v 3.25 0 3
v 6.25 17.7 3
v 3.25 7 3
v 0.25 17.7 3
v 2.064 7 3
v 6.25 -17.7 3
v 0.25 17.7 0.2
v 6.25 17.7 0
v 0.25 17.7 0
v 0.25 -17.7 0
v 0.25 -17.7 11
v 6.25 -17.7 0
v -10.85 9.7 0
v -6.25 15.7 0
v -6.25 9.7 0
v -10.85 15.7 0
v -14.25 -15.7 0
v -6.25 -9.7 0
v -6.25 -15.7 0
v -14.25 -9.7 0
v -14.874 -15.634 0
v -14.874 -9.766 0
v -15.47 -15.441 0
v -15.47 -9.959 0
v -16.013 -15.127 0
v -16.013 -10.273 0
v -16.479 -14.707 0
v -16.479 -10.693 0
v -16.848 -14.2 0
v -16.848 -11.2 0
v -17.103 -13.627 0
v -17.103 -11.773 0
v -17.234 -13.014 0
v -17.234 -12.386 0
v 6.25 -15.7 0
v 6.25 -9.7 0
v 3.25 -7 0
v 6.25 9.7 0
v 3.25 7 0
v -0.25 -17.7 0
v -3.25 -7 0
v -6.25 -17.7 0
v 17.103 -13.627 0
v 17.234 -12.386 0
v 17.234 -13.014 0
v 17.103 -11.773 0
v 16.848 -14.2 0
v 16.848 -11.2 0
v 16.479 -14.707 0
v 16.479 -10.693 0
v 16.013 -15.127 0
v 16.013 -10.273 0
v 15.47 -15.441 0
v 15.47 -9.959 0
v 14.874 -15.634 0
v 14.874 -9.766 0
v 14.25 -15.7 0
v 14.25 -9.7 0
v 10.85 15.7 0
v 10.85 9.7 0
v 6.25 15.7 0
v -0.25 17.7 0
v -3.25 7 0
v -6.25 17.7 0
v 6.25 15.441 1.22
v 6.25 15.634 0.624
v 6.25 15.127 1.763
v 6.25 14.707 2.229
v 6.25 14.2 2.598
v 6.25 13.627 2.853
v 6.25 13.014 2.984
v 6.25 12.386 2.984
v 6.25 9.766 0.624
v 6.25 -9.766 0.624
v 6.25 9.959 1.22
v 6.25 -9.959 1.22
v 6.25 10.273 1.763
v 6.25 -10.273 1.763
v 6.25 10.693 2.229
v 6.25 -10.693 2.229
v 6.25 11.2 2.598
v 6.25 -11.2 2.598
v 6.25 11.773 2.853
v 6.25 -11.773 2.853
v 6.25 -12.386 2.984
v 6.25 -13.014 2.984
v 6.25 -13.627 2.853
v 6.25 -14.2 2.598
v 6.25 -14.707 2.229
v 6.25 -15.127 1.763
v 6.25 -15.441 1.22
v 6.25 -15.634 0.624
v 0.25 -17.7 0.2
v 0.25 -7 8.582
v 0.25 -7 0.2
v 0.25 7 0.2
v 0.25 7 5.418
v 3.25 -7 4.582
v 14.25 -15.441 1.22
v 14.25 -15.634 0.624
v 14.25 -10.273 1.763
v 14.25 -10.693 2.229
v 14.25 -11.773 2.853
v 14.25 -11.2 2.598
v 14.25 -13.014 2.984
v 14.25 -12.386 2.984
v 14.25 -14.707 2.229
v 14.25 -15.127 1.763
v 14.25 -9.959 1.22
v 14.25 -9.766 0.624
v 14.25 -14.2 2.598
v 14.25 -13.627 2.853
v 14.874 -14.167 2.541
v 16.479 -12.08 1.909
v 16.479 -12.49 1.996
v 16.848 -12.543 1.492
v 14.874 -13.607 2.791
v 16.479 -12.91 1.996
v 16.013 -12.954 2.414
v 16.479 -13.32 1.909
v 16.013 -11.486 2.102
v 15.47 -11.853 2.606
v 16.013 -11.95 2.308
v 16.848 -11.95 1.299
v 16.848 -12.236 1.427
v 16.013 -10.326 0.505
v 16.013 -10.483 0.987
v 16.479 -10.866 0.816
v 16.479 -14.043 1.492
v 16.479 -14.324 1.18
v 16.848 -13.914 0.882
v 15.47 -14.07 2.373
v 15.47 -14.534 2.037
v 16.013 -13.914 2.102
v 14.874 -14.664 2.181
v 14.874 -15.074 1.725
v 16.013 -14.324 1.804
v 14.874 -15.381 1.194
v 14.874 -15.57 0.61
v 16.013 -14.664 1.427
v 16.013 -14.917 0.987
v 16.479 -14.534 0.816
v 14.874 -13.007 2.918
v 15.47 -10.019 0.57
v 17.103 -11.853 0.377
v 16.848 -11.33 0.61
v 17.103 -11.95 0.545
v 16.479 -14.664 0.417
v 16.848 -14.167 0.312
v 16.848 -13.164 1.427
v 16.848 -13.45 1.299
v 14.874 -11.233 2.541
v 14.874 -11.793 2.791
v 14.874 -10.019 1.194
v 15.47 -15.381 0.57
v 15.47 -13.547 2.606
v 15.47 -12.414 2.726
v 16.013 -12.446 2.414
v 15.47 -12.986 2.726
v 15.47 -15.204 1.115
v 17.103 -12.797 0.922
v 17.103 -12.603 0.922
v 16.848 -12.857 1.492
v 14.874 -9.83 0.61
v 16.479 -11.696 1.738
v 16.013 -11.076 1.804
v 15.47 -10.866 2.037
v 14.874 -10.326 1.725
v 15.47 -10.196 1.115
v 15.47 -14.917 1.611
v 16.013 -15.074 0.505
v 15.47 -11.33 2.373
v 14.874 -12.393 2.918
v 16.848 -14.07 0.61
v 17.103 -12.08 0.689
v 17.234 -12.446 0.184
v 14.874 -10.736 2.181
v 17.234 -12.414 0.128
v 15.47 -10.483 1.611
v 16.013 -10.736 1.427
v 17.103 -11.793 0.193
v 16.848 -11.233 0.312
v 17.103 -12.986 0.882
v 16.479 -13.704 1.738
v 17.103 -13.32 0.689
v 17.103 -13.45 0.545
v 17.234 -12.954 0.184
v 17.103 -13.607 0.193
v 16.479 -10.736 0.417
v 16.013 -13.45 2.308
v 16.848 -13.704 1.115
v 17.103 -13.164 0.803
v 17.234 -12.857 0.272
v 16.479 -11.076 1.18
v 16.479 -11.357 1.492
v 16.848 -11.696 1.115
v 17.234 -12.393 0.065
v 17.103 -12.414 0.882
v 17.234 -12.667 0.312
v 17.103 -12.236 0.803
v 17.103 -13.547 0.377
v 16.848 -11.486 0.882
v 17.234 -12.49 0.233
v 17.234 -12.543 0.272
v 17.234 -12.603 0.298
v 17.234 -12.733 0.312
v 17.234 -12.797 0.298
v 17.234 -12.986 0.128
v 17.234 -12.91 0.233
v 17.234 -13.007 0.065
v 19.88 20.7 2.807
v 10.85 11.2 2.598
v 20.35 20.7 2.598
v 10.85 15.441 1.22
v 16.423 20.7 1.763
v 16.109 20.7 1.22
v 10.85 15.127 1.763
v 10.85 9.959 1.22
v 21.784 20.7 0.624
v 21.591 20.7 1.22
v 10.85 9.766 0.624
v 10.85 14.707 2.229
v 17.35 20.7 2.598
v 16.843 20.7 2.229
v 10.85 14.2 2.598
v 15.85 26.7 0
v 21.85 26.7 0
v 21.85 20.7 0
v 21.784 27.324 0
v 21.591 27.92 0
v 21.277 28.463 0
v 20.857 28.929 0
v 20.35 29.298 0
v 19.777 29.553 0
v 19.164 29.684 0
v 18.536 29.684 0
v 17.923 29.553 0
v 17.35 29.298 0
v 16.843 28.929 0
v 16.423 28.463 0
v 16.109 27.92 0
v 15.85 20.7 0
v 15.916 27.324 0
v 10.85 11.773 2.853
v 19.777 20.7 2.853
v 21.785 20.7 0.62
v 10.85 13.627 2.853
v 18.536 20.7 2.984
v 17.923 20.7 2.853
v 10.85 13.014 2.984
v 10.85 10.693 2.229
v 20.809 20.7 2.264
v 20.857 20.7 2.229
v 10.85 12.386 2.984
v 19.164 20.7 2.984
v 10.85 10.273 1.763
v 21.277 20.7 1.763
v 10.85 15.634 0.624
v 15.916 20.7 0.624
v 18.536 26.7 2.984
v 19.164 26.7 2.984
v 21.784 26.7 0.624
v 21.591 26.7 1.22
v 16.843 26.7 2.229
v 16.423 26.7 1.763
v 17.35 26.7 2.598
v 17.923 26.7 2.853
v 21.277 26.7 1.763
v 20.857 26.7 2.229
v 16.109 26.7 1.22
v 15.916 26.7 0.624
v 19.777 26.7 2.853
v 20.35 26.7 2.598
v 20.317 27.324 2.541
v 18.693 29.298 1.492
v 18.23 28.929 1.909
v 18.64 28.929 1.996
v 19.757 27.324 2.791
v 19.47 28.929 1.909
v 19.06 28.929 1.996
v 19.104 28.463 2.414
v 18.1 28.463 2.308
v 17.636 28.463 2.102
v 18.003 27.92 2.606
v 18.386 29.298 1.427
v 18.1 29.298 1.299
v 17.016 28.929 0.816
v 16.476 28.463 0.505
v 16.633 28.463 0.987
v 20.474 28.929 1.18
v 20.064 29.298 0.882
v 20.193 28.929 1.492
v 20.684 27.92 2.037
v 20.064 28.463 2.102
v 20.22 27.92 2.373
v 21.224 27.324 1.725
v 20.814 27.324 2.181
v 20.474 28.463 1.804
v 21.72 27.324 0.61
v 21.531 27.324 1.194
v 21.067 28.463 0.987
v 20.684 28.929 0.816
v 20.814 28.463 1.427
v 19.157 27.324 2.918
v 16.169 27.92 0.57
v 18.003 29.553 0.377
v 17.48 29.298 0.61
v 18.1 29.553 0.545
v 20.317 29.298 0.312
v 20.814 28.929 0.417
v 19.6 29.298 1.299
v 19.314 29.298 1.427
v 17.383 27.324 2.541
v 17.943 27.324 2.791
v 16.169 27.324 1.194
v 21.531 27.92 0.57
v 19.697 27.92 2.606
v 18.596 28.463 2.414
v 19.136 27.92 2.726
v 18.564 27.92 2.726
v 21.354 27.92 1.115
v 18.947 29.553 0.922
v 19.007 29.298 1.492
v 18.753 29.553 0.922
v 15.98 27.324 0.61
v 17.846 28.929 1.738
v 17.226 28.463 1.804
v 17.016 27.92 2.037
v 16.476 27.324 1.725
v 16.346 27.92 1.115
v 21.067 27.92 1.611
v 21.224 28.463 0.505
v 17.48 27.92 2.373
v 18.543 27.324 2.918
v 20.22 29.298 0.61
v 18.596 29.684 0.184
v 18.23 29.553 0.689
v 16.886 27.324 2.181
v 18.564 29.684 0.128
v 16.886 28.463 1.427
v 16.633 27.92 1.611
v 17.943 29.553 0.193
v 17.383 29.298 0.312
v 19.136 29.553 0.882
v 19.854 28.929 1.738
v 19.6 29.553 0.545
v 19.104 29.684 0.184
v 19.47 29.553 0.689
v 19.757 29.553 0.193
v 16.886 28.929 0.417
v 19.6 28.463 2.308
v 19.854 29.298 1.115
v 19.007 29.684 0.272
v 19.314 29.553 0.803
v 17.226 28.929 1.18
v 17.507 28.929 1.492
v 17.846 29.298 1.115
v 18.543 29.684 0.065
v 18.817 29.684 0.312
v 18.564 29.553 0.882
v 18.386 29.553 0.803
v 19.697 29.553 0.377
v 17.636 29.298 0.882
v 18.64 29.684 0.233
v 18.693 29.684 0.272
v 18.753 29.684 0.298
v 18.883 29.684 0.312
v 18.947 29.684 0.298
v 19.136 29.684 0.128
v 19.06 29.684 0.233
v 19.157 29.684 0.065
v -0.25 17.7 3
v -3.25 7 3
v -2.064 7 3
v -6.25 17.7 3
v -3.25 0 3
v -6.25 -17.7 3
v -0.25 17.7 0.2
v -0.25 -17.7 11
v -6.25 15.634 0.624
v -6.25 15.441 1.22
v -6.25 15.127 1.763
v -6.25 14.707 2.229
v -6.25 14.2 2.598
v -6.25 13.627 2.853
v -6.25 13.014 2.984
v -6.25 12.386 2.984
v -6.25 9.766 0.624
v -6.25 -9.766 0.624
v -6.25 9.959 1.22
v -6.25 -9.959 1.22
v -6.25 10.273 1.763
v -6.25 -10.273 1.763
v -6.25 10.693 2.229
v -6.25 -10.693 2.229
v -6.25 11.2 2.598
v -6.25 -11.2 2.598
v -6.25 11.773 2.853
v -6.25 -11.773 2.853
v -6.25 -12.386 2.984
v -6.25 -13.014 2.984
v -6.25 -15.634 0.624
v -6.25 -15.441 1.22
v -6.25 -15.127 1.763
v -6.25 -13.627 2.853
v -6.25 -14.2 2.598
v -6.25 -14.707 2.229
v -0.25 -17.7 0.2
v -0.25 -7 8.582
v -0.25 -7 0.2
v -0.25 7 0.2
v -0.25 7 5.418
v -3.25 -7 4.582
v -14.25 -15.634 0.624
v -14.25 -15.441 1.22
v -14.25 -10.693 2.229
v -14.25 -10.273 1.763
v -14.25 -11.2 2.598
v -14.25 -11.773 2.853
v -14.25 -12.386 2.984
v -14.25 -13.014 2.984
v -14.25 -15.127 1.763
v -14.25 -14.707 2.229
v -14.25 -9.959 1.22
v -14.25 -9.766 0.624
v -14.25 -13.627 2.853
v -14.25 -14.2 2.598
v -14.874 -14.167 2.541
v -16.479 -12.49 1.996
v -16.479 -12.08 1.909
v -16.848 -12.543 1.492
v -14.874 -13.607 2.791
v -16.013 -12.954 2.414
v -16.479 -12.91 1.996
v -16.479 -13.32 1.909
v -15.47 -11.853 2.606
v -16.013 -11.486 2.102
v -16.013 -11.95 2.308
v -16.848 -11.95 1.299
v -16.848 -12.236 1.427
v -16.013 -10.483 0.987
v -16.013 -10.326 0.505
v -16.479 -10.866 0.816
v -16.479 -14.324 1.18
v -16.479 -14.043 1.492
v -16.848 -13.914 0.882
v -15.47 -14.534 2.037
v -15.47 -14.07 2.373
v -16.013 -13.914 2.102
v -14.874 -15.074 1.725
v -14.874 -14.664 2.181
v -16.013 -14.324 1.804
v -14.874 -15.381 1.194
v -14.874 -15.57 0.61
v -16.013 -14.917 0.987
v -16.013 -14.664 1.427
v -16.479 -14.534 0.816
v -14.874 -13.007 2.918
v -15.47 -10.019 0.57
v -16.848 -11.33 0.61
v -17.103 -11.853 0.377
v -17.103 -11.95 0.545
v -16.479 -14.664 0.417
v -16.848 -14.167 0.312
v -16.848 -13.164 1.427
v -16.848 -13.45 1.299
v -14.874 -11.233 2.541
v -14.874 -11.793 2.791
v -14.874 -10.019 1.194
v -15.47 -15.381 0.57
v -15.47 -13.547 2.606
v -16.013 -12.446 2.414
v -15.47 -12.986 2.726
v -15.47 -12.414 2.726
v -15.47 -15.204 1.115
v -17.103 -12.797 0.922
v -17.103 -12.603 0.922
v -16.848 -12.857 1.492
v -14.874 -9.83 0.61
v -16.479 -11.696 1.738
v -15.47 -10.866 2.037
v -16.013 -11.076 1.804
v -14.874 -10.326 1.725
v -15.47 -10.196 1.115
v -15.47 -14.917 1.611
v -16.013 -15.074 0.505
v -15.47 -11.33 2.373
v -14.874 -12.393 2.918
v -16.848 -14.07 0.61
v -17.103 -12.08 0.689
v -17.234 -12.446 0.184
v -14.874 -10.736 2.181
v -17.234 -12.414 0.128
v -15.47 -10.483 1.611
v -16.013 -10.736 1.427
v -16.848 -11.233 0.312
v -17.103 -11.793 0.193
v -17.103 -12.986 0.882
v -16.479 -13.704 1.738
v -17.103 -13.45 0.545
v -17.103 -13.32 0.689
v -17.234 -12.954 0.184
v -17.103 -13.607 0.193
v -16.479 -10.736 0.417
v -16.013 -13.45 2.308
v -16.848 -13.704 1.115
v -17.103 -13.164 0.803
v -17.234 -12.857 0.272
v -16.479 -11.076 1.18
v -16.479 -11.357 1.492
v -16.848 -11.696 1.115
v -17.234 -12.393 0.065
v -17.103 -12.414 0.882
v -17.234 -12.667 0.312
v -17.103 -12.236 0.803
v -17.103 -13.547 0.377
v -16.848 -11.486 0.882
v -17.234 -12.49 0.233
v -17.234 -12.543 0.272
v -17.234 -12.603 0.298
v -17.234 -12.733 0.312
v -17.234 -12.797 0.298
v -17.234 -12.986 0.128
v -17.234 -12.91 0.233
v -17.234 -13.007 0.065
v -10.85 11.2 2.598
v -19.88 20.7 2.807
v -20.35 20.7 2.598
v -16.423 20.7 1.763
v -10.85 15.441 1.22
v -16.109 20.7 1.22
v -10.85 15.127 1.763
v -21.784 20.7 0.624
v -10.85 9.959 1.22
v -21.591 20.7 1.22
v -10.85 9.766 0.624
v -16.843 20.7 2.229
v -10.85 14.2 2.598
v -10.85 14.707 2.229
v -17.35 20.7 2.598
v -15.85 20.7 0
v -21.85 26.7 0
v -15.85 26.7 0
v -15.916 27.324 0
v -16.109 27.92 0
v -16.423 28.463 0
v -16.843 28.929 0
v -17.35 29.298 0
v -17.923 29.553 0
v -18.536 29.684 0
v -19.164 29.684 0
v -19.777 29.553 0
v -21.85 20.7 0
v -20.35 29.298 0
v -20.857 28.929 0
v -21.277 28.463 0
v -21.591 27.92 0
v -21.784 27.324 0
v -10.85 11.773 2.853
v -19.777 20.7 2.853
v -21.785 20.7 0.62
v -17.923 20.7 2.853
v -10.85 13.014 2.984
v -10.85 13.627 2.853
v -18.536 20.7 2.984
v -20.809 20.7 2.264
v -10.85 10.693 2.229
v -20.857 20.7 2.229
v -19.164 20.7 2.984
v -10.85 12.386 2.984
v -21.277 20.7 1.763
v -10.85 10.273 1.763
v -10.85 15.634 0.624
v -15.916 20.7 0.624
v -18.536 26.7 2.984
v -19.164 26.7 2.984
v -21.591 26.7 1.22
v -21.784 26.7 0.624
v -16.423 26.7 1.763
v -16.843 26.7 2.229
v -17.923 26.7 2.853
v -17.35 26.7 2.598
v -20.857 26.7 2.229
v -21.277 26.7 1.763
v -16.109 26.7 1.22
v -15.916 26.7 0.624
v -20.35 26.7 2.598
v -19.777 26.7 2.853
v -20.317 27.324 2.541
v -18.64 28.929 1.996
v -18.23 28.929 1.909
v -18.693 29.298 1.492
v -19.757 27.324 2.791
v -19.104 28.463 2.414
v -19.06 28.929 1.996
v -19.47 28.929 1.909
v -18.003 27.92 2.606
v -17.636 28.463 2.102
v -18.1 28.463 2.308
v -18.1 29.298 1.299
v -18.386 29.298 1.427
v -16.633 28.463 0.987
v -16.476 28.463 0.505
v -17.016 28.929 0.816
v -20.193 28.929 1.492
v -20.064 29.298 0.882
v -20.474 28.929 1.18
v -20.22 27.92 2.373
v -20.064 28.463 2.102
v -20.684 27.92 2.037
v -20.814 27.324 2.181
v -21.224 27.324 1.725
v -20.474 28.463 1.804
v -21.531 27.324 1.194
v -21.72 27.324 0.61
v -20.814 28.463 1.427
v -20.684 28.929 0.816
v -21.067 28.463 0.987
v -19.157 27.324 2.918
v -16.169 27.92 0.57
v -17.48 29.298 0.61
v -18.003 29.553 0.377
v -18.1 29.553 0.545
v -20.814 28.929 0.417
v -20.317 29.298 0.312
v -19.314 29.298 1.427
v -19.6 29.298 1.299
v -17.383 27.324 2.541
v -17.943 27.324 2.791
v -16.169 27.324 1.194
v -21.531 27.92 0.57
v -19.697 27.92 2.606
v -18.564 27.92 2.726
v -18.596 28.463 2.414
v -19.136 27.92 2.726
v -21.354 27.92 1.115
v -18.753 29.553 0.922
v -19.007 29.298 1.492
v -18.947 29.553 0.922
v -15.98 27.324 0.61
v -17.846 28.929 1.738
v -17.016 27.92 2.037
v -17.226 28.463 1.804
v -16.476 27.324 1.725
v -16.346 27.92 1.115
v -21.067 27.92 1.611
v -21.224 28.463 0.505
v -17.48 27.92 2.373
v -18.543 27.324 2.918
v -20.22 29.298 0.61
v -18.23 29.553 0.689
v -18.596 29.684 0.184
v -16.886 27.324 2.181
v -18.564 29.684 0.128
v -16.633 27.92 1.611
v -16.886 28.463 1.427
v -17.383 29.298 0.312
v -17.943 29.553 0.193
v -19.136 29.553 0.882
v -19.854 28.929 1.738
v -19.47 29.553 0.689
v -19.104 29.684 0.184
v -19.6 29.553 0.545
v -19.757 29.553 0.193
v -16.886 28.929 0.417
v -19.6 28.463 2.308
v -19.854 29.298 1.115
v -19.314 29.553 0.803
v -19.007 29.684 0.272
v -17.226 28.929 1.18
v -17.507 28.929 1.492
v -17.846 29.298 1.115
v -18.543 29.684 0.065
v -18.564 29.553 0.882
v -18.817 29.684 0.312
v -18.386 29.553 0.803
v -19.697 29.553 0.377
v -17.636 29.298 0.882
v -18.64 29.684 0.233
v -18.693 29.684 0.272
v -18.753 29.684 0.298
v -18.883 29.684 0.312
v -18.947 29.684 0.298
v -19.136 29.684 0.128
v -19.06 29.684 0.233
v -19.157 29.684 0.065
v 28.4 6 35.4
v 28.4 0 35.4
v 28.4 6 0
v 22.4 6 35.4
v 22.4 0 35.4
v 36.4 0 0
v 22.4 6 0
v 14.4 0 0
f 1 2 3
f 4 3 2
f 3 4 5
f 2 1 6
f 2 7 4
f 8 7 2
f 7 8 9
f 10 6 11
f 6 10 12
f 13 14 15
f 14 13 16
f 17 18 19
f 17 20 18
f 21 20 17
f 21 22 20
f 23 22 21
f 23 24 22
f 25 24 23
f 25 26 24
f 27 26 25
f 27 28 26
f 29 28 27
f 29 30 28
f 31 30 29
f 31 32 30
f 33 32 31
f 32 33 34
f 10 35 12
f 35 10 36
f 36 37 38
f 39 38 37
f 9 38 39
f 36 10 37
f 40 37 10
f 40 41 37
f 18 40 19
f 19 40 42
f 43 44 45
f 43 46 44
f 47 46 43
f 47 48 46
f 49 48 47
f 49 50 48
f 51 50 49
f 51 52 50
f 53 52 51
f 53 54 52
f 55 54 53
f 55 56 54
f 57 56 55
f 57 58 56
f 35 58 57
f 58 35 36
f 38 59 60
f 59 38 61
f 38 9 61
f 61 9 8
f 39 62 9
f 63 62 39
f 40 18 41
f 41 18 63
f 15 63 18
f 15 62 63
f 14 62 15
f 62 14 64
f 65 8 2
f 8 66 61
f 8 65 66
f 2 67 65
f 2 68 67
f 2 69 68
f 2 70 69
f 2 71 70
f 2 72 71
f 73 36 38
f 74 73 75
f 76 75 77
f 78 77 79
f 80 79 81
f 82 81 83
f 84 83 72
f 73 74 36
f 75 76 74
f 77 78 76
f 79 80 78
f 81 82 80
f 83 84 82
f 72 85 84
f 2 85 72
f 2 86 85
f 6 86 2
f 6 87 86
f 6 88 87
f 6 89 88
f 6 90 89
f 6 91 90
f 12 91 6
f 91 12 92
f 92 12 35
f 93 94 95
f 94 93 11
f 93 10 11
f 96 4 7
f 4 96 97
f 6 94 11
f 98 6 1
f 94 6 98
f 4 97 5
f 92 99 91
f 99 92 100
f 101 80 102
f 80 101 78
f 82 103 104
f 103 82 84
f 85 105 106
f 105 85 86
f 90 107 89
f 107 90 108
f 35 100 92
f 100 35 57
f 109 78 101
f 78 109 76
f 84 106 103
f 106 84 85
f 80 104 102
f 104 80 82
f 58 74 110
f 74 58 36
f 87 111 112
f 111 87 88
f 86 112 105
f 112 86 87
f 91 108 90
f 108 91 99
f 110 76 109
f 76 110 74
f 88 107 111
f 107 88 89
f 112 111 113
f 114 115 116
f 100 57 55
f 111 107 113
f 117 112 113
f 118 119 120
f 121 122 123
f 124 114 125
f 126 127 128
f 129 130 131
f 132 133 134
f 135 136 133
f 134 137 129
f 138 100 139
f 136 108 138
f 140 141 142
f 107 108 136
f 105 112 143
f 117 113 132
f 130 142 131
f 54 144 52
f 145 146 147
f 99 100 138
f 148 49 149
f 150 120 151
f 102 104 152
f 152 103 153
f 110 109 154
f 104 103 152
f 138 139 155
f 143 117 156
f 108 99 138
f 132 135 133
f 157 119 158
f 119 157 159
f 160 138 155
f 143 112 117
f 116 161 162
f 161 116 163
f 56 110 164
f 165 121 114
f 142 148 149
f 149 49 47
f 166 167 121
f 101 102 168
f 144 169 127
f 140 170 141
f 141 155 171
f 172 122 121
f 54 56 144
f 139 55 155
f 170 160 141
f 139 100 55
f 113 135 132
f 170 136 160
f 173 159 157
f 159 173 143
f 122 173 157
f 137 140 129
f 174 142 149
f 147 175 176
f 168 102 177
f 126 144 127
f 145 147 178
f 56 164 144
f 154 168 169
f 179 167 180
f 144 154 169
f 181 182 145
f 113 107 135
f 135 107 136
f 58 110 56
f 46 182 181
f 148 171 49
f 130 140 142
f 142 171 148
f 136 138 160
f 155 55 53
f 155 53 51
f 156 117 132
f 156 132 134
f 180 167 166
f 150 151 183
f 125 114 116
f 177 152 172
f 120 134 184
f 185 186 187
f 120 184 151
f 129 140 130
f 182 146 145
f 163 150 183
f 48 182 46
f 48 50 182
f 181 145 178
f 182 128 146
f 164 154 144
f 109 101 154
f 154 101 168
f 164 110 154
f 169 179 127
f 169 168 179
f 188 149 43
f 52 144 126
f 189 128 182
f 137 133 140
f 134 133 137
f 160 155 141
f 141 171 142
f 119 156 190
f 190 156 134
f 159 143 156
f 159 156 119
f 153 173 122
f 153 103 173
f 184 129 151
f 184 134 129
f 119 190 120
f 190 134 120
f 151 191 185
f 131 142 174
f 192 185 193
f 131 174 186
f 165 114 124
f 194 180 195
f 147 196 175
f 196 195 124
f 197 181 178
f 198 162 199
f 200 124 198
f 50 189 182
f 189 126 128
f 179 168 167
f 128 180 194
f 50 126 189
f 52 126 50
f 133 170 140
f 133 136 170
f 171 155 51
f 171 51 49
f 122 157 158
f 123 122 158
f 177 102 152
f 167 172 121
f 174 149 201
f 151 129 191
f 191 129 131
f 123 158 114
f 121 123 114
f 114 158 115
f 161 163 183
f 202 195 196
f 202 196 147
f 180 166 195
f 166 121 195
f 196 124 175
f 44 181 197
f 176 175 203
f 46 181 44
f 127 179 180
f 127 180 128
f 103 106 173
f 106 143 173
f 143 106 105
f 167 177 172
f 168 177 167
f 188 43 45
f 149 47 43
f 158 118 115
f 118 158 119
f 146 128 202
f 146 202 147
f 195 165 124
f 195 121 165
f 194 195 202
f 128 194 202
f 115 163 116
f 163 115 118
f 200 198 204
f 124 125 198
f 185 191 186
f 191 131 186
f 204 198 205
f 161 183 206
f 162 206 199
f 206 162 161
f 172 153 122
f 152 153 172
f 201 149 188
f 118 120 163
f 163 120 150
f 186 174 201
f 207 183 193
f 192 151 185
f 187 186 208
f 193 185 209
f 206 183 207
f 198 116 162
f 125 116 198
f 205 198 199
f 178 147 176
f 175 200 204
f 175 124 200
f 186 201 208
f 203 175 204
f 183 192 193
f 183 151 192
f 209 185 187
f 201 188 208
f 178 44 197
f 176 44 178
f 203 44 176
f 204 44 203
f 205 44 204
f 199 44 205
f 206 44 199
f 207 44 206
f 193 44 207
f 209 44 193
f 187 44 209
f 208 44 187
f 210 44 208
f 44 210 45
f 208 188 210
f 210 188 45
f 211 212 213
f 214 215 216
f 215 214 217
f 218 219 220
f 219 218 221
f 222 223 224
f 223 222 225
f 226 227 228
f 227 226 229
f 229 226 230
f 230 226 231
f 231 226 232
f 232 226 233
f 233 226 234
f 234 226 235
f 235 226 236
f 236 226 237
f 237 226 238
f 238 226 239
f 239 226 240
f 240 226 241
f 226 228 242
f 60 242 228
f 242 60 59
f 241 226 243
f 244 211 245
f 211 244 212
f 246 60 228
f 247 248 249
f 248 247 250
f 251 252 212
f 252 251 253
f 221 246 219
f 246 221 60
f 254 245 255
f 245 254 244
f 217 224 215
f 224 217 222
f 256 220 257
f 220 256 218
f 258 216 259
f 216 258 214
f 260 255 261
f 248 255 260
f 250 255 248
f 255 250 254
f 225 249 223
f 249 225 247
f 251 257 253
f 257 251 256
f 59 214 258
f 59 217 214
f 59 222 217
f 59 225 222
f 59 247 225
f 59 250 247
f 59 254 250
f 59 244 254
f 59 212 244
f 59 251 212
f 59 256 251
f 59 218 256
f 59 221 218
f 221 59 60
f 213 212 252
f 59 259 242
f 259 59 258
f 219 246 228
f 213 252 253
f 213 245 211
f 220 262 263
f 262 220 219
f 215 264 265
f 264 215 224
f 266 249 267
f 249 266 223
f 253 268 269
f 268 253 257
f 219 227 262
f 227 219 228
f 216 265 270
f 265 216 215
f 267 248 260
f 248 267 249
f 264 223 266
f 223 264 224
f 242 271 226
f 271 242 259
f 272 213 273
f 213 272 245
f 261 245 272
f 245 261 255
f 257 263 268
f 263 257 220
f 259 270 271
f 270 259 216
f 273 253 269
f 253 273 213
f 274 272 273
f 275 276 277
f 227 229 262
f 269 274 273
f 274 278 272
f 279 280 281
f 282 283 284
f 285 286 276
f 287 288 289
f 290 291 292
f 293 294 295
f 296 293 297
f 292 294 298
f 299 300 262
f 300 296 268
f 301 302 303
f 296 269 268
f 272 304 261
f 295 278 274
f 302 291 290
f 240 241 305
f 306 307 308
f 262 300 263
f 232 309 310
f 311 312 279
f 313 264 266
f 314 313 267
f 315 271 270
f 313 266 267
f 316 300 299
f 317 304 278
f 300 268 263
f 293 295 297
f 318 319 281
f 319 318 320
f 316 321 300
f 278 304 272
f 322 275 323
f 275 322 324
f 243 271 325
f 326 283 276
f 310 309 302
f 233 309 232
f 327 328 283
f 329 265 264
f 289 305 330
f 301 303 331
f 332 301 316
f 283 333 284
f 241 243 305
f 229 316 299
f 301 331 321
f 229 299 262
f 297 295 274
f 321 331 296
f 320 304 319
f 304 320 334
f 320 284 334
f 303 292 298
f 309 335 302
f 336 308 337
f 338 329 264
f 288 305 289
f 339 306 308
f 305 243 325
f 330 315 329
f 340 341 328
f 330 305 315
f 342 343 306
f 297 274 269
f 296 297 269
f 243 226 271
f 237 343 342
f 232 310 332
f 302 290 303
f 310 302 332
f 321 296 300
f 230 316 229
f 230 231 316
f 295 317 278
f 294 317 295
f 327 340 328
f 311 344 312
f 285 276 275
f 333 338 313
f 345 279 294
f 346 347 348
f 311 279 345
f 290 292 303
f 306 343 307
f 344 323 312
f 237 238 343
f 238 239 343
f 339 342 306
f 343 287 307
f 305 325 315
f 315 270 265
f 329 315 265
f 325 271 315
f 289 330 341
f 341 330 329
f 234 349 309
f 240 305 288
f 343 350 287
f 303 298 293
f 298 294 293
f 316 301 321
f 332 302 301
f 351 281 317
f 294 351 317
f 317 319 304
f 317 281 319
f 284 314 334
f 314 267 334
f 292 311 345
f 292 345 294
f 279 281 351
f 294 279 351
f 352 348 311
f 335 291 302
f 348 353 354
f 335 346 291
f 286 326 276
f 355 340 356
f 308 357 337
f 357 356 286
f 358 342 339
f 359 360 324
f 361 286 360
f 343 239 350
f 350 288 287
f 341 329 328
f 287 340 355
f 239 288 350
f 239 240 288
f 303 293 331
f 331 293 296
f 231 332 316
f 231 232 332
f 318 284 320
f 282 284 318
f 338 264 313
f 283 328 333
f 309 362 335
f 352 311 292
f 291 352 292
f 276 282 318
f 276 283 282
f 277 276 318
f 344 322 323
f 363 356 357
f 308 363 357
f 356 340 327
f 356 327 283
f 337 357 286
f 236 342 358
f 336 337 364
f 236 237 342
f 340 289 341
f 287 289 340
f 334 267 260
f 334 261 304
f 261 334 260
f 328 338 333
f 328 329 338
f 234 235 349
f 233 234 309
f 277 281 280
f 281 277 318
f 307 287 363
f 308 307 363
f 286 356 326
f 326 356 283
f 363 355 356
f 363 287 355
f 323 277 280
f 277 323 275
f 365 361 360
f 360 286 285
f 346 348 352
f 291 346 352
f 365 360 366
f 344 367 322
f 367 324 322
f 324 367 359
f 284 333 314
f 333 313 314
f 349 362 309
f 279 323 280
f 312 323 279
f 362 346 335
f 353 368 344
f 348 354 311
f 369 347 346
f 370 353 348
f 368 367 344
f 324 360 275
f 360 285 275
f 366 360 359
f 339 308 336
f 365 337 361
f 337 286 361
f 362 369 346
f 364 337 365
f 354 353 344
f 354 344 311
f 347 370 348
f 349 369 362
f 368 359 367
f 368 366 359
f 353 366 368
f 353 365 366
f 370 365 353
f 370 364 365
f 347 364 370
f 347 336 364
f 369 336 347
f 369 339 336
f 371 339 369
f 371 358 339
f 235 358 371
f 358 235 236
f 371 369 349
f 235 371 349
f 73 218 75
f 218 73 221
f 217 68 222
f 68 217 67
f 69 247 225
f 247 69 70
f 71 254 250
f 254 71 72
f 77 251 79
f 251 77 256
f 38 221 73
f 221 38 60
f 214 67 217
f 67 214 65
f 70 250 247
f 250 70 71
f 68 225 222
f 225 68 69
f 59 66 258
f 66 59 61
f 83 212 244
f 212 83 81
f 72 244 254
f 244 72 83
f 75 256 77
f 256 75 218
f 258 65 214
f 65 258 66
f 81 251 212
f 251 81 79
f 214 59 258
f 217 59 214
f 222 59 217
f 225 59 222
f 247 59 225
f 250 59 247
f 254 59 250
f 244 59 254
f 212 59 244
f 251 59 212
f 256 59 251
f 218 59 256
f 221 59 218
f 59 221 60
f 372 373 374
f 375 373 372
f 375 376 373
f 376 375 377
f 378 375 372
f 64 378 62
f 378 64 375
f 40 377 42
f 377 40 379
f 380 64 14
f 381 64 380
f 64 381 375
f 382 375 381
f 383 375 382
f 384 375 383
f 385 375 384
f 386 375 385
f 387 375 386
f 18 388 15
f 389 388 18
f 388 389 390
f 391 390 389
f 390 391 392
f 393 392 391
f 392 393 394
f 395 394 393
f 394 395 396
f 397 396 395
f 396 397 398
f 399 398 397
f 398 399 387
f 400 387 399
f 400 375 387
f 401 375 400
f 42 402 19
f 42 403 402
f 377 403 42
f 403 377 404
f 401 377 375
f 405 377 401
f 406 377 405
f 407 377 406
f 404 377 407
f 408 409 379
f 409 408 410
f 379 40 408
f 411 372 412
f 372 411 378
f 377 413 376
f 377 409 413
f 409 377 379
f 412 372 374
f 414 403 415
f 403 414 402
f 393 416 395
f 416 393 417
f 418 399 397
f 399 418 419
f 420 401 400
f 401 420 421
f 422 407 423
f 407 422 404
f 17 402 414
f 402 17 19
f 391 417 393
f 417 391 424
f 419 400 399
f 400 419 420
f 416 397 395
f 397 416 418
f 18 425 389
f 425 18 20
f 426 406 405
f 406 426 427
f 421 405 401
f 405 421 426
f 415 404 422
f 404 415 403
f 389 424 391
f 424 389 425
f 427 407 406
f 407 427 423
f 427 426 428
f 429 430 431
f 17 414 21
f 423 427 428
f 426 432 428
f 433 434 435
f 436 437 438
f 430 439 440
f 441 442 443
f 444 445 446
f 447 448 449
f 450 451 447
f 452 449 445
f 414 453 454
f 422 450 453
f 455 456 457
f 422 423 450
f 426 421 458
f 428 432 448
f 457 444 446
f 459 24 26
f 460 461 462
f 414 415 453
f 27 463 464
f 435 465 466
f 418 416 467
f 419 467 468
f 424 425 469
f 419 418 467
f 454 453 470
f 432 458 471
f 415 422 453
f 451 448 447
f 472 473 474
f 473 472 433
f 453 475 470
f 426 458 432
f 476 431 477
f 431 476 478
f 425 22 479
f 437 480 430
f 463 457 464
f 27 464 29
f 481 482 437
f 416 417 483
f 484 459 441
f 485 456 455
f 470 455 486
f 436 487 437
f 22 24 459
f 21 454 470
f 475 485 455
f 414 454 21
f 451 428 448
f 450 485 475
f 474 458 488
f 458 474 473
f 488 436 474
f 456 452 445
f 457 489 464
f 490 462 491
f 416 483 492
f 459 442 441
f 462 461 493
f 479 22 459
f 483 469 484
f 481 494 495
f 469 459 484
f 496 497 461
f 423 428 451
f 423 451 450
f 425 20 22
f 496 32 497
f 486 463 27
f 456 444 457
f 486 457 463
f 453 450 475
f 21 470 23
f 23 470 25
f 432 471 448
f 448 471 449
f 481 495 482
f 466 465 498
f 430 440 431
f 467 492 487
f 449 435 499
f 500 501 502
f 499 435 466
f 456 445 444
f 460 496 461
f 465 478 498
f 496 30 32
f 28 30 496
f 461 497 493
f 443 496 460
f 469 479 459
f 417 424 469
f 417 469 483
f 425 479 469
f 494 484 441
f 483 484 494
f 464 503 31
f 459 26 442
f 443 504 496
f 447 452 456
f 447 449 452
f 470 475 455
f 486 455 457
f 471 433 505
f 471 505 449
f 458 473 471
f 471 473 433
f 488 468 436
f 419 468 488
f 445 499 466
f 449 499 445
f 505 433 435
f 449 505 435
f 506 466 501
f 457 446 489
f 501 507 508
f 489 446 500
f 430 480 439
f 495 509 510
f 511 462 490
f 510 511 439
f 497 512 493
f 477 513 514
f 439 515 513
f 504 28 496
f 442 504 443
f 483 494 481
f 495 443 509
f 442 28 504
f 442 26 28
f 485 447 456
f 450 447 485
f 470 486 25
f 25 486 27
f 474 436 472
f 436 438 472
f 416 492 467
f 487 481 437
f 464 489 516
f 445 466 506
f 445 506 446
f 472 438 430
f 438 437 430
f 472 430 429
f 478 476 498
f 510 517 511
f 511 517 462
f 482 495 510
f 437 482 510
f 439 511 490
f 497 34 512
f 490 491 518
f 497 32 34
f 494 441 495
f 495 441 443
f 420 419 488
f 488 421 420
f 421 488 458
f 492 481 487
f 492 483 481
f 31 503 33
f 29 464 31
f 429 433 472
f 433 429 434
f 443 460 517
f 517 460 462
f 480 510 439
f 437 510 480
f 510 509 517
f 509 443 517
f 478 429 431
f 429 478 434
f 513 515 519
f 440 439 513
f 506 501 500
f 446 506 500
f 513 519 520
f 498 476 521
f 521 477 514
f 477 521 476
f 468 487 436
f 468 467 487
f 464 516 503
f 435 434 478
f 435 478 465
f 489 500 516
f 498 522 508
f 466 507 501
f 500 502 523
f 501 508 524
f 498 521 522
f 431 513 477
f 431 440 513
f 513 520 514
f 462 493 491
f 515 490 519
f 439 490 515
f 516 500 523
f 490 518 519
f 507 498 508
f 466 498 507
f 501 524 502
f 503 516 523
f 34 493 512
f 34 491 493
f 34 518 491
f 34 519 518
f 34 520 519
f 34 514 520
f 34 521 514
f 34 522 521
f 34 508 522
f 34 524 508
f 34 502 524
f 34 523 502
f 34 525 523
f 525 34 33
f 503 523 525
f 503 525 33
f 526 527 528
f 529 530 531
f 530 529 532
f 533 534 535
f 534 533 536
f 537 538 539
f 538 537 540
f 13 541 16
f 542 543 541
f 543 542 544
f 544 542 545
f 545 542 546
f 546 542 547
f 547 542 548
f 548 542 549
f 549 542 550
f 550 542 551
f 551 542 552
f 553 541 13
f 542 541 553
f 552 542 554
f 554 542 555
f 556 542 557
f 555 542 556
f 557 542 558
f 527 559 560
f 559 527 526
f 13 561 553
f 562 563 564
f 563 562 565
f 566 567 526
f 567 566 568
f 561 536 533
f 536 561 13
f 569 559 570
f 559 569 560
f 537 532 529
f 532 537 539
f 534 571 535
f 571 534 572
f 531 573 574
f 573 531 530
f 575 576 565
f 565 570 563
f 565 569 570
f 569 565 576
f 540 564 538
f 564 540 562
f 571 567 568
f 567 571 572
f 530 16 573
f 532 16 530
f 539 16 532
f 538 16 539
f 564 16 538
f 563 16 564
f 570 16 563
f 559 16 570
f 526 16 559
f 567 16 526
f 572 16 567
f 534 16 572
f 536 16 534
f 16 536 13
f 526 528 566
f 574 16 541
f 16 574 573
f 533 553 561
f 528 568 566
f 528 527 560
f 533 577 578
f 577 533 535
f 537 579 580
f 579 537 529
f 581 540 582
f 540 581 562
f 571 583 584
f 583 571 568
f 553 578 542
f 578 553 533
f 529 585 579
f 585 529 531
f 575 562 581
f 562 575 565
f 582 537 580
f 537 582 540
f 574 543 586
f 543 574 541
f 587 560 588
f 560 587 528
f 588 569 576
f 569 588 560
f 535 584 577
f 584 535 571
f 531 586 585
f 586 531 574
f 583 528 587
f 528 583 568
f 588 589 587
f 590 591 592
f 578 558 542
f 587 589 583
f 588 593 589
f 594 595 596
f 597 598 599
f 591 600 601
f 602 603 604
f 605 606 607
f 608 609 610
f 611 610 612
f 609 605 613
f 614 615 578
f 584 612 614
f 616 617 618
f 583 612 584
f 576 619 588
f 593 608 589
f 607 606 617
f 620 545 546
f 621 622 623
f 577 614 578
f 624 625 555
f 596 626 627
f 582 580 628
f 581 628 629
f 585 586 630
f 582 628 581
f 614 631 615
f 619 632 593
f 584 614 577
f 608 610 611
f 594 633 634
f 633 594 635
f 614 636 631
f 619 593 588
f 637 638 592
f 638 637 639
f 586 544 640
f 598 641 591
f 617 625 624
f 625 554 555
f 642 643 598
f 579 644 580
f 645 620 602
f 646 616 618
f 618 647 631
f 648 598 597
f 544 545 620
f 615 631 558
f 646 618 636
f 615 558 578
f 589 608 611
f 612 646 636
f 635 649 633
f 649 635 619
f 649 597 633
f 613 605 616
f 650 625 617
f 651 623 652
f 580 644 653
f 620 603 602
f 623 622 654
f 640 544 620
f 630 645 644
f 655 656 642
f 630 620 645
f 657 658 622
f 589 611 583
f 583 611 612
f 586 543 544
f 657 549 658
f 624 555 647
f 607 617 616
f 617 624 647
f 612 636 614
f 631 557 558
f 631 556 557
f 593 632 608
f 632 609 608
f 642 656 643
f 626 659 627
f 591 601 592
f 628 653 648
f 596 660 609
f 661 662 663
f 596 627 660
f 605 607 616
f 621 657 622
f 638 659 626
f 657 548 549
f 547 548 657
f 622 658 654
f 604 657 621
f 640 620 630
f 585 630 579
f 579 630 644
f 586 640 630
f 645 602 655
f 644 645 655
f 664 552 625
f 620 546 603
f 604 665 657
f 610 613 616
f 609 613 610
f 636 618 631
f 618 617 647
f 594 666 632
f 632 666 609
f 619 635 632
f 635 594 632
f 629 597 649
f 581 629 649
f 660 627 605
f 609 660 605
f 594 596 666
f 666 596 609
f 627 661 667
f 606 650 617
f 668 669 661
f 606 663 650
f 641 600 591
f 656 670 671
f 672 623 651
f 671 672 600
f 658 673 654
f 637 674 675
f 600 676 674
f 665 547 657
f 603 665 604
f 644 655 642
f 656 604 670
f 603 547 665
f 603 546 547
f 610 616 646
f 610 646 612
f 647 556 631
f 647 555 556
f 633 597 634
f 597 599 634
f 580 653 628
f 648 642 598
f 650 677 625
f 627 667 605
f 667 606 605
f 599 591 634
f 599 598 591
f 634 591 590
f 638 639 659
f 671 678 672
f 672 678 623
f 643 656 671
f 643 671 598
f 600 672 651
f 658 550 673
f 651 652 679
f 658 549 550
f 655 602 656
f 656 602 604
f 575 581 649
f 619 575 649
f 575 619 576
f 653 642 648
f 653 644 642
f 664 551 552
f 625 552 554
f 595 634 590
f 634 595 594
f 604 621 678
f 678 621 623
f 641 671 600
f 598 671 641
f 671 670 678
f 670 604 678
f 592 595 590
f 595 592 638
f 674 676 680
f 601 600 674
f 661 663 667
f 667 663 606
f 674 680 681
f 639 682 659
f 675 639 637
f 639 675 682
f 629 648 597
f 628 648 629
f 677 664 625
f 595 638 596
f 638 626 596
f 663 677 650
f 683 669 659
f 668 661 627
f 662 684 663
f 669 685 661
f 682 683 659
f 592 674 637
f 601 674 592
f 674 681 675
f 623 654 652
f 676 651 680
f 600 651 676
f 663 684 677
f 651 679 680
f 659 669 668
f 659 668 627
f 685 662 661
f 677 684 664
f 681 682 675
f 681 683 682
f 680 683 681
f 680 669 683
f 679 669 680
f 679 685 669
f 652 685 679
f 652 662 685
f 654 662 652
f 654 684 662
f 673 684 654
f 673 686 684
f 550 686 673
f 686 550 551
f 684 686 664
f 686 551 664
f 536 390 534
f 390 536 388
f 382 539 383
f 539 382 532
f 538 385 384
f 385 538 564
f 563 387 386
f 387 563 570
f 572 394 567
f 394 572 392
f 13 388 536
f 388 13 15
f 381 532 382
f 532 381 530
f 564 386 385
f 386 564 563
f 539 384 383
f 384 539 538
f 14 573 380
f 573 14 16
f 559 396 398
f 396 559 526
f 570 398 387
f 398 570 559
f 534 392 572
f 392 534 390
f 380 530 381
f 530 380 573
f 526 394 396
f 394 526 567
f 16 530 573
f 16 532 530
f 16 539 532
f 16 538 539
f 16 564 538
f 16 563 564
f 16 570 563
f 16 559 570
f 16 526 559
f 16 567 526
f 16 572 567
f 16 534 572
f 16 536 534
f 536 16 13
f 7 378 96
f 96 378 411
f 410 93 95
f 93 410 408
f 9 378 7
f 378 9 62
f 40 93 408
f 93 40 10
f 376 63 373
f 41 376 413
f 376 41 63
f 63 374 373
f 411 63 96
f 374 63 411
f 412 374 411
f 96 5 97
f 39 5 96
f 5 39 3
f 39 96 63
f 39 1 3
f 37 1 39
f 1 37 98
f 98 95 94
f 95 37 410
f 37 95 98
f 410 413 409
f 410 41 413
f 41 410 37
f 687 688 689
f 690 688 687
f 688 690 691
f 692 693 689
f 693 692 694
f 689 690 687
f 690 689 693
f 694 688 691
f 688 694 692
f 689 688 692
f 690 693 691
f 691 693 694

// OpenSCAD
peg_diameter=6; // [3:.1:10]
peg_spacing=25.4;
highpeg_stickout=4.6;
highpeg_angleout=8;
highpeg_stickup=6;
lowpeg_stickout=8;

peg_radius = peg_diameter / 2;
holder_height = 25.4 + 6 + 4;

module quartersphere(radius=peg_radius) {
    rotate_extrude(angle=-180) intersection() {
        square(radius);
        circle(radius);
    };
}

module halfcylinder(length, radius=peg_radius) {
    rotate_extrude(angle=-180) square([radius,length]);
    translate([0,0,length]) children();
}

module angledhalfcylinder(length, radius=peg_radius) {
    intersection() {
        multmatrix([
            [1, 0,-1, 0],
            [0, 1, 0, 0],
            [0, 0, 1, 0]
        ])
        halfcylinder(length + radius, radius);
        
        translate([-length, -radius, 0])
        cube([length + radius, radius, length + radius]);
    };

    translate([-length, 0, length])
    rotate([0,-90,0])
    children();
}

module double(v=[1,0,0]) {
    children();
    mirror(v) children();
}

module halfHolder() {
    cube([3,6,holder_height]);

    translate([3,0,0]) 
    linear_extrude(holder_height, scale=0)
    polygon([[0,0], [8,0], [0,6]]);
}

module holder() {
    double() halfHolder(); 
}

module halfPeglockAttachment() {
    translate([0, -holder_height/2]) rotate([-90,0,0]) rotate([0,0,-90])
    halfHolder();

    translate([6, -peg_spacing/2]) rotate([-90,0,-90])
    halfcylinder(lowpeg_stickout)
    quartersphere();
    
    translate([6, +peg_spacing/2]) rotate([-90,0,-90])
    halfcylinder(highpeg_stickout)
    angledhalfcylinder(highpeg_angleout)
    halfcylinder(highpeg_stickup)
    quartersphere();
}

module peglockAttachment() {
    difference() {
        union() {
            double() translate([.25,0,0]) halfPeglockAttachment();
            linear_extrude(.2) square([.5,holder_height], center=true); 
        }
        translate([0,0,-.5]) linear_extrude(12) square([6.5,14], center=true); 
    }
}

$fs=.08;
peglockAttachment();

translate([25.4,0,0]) holder();
